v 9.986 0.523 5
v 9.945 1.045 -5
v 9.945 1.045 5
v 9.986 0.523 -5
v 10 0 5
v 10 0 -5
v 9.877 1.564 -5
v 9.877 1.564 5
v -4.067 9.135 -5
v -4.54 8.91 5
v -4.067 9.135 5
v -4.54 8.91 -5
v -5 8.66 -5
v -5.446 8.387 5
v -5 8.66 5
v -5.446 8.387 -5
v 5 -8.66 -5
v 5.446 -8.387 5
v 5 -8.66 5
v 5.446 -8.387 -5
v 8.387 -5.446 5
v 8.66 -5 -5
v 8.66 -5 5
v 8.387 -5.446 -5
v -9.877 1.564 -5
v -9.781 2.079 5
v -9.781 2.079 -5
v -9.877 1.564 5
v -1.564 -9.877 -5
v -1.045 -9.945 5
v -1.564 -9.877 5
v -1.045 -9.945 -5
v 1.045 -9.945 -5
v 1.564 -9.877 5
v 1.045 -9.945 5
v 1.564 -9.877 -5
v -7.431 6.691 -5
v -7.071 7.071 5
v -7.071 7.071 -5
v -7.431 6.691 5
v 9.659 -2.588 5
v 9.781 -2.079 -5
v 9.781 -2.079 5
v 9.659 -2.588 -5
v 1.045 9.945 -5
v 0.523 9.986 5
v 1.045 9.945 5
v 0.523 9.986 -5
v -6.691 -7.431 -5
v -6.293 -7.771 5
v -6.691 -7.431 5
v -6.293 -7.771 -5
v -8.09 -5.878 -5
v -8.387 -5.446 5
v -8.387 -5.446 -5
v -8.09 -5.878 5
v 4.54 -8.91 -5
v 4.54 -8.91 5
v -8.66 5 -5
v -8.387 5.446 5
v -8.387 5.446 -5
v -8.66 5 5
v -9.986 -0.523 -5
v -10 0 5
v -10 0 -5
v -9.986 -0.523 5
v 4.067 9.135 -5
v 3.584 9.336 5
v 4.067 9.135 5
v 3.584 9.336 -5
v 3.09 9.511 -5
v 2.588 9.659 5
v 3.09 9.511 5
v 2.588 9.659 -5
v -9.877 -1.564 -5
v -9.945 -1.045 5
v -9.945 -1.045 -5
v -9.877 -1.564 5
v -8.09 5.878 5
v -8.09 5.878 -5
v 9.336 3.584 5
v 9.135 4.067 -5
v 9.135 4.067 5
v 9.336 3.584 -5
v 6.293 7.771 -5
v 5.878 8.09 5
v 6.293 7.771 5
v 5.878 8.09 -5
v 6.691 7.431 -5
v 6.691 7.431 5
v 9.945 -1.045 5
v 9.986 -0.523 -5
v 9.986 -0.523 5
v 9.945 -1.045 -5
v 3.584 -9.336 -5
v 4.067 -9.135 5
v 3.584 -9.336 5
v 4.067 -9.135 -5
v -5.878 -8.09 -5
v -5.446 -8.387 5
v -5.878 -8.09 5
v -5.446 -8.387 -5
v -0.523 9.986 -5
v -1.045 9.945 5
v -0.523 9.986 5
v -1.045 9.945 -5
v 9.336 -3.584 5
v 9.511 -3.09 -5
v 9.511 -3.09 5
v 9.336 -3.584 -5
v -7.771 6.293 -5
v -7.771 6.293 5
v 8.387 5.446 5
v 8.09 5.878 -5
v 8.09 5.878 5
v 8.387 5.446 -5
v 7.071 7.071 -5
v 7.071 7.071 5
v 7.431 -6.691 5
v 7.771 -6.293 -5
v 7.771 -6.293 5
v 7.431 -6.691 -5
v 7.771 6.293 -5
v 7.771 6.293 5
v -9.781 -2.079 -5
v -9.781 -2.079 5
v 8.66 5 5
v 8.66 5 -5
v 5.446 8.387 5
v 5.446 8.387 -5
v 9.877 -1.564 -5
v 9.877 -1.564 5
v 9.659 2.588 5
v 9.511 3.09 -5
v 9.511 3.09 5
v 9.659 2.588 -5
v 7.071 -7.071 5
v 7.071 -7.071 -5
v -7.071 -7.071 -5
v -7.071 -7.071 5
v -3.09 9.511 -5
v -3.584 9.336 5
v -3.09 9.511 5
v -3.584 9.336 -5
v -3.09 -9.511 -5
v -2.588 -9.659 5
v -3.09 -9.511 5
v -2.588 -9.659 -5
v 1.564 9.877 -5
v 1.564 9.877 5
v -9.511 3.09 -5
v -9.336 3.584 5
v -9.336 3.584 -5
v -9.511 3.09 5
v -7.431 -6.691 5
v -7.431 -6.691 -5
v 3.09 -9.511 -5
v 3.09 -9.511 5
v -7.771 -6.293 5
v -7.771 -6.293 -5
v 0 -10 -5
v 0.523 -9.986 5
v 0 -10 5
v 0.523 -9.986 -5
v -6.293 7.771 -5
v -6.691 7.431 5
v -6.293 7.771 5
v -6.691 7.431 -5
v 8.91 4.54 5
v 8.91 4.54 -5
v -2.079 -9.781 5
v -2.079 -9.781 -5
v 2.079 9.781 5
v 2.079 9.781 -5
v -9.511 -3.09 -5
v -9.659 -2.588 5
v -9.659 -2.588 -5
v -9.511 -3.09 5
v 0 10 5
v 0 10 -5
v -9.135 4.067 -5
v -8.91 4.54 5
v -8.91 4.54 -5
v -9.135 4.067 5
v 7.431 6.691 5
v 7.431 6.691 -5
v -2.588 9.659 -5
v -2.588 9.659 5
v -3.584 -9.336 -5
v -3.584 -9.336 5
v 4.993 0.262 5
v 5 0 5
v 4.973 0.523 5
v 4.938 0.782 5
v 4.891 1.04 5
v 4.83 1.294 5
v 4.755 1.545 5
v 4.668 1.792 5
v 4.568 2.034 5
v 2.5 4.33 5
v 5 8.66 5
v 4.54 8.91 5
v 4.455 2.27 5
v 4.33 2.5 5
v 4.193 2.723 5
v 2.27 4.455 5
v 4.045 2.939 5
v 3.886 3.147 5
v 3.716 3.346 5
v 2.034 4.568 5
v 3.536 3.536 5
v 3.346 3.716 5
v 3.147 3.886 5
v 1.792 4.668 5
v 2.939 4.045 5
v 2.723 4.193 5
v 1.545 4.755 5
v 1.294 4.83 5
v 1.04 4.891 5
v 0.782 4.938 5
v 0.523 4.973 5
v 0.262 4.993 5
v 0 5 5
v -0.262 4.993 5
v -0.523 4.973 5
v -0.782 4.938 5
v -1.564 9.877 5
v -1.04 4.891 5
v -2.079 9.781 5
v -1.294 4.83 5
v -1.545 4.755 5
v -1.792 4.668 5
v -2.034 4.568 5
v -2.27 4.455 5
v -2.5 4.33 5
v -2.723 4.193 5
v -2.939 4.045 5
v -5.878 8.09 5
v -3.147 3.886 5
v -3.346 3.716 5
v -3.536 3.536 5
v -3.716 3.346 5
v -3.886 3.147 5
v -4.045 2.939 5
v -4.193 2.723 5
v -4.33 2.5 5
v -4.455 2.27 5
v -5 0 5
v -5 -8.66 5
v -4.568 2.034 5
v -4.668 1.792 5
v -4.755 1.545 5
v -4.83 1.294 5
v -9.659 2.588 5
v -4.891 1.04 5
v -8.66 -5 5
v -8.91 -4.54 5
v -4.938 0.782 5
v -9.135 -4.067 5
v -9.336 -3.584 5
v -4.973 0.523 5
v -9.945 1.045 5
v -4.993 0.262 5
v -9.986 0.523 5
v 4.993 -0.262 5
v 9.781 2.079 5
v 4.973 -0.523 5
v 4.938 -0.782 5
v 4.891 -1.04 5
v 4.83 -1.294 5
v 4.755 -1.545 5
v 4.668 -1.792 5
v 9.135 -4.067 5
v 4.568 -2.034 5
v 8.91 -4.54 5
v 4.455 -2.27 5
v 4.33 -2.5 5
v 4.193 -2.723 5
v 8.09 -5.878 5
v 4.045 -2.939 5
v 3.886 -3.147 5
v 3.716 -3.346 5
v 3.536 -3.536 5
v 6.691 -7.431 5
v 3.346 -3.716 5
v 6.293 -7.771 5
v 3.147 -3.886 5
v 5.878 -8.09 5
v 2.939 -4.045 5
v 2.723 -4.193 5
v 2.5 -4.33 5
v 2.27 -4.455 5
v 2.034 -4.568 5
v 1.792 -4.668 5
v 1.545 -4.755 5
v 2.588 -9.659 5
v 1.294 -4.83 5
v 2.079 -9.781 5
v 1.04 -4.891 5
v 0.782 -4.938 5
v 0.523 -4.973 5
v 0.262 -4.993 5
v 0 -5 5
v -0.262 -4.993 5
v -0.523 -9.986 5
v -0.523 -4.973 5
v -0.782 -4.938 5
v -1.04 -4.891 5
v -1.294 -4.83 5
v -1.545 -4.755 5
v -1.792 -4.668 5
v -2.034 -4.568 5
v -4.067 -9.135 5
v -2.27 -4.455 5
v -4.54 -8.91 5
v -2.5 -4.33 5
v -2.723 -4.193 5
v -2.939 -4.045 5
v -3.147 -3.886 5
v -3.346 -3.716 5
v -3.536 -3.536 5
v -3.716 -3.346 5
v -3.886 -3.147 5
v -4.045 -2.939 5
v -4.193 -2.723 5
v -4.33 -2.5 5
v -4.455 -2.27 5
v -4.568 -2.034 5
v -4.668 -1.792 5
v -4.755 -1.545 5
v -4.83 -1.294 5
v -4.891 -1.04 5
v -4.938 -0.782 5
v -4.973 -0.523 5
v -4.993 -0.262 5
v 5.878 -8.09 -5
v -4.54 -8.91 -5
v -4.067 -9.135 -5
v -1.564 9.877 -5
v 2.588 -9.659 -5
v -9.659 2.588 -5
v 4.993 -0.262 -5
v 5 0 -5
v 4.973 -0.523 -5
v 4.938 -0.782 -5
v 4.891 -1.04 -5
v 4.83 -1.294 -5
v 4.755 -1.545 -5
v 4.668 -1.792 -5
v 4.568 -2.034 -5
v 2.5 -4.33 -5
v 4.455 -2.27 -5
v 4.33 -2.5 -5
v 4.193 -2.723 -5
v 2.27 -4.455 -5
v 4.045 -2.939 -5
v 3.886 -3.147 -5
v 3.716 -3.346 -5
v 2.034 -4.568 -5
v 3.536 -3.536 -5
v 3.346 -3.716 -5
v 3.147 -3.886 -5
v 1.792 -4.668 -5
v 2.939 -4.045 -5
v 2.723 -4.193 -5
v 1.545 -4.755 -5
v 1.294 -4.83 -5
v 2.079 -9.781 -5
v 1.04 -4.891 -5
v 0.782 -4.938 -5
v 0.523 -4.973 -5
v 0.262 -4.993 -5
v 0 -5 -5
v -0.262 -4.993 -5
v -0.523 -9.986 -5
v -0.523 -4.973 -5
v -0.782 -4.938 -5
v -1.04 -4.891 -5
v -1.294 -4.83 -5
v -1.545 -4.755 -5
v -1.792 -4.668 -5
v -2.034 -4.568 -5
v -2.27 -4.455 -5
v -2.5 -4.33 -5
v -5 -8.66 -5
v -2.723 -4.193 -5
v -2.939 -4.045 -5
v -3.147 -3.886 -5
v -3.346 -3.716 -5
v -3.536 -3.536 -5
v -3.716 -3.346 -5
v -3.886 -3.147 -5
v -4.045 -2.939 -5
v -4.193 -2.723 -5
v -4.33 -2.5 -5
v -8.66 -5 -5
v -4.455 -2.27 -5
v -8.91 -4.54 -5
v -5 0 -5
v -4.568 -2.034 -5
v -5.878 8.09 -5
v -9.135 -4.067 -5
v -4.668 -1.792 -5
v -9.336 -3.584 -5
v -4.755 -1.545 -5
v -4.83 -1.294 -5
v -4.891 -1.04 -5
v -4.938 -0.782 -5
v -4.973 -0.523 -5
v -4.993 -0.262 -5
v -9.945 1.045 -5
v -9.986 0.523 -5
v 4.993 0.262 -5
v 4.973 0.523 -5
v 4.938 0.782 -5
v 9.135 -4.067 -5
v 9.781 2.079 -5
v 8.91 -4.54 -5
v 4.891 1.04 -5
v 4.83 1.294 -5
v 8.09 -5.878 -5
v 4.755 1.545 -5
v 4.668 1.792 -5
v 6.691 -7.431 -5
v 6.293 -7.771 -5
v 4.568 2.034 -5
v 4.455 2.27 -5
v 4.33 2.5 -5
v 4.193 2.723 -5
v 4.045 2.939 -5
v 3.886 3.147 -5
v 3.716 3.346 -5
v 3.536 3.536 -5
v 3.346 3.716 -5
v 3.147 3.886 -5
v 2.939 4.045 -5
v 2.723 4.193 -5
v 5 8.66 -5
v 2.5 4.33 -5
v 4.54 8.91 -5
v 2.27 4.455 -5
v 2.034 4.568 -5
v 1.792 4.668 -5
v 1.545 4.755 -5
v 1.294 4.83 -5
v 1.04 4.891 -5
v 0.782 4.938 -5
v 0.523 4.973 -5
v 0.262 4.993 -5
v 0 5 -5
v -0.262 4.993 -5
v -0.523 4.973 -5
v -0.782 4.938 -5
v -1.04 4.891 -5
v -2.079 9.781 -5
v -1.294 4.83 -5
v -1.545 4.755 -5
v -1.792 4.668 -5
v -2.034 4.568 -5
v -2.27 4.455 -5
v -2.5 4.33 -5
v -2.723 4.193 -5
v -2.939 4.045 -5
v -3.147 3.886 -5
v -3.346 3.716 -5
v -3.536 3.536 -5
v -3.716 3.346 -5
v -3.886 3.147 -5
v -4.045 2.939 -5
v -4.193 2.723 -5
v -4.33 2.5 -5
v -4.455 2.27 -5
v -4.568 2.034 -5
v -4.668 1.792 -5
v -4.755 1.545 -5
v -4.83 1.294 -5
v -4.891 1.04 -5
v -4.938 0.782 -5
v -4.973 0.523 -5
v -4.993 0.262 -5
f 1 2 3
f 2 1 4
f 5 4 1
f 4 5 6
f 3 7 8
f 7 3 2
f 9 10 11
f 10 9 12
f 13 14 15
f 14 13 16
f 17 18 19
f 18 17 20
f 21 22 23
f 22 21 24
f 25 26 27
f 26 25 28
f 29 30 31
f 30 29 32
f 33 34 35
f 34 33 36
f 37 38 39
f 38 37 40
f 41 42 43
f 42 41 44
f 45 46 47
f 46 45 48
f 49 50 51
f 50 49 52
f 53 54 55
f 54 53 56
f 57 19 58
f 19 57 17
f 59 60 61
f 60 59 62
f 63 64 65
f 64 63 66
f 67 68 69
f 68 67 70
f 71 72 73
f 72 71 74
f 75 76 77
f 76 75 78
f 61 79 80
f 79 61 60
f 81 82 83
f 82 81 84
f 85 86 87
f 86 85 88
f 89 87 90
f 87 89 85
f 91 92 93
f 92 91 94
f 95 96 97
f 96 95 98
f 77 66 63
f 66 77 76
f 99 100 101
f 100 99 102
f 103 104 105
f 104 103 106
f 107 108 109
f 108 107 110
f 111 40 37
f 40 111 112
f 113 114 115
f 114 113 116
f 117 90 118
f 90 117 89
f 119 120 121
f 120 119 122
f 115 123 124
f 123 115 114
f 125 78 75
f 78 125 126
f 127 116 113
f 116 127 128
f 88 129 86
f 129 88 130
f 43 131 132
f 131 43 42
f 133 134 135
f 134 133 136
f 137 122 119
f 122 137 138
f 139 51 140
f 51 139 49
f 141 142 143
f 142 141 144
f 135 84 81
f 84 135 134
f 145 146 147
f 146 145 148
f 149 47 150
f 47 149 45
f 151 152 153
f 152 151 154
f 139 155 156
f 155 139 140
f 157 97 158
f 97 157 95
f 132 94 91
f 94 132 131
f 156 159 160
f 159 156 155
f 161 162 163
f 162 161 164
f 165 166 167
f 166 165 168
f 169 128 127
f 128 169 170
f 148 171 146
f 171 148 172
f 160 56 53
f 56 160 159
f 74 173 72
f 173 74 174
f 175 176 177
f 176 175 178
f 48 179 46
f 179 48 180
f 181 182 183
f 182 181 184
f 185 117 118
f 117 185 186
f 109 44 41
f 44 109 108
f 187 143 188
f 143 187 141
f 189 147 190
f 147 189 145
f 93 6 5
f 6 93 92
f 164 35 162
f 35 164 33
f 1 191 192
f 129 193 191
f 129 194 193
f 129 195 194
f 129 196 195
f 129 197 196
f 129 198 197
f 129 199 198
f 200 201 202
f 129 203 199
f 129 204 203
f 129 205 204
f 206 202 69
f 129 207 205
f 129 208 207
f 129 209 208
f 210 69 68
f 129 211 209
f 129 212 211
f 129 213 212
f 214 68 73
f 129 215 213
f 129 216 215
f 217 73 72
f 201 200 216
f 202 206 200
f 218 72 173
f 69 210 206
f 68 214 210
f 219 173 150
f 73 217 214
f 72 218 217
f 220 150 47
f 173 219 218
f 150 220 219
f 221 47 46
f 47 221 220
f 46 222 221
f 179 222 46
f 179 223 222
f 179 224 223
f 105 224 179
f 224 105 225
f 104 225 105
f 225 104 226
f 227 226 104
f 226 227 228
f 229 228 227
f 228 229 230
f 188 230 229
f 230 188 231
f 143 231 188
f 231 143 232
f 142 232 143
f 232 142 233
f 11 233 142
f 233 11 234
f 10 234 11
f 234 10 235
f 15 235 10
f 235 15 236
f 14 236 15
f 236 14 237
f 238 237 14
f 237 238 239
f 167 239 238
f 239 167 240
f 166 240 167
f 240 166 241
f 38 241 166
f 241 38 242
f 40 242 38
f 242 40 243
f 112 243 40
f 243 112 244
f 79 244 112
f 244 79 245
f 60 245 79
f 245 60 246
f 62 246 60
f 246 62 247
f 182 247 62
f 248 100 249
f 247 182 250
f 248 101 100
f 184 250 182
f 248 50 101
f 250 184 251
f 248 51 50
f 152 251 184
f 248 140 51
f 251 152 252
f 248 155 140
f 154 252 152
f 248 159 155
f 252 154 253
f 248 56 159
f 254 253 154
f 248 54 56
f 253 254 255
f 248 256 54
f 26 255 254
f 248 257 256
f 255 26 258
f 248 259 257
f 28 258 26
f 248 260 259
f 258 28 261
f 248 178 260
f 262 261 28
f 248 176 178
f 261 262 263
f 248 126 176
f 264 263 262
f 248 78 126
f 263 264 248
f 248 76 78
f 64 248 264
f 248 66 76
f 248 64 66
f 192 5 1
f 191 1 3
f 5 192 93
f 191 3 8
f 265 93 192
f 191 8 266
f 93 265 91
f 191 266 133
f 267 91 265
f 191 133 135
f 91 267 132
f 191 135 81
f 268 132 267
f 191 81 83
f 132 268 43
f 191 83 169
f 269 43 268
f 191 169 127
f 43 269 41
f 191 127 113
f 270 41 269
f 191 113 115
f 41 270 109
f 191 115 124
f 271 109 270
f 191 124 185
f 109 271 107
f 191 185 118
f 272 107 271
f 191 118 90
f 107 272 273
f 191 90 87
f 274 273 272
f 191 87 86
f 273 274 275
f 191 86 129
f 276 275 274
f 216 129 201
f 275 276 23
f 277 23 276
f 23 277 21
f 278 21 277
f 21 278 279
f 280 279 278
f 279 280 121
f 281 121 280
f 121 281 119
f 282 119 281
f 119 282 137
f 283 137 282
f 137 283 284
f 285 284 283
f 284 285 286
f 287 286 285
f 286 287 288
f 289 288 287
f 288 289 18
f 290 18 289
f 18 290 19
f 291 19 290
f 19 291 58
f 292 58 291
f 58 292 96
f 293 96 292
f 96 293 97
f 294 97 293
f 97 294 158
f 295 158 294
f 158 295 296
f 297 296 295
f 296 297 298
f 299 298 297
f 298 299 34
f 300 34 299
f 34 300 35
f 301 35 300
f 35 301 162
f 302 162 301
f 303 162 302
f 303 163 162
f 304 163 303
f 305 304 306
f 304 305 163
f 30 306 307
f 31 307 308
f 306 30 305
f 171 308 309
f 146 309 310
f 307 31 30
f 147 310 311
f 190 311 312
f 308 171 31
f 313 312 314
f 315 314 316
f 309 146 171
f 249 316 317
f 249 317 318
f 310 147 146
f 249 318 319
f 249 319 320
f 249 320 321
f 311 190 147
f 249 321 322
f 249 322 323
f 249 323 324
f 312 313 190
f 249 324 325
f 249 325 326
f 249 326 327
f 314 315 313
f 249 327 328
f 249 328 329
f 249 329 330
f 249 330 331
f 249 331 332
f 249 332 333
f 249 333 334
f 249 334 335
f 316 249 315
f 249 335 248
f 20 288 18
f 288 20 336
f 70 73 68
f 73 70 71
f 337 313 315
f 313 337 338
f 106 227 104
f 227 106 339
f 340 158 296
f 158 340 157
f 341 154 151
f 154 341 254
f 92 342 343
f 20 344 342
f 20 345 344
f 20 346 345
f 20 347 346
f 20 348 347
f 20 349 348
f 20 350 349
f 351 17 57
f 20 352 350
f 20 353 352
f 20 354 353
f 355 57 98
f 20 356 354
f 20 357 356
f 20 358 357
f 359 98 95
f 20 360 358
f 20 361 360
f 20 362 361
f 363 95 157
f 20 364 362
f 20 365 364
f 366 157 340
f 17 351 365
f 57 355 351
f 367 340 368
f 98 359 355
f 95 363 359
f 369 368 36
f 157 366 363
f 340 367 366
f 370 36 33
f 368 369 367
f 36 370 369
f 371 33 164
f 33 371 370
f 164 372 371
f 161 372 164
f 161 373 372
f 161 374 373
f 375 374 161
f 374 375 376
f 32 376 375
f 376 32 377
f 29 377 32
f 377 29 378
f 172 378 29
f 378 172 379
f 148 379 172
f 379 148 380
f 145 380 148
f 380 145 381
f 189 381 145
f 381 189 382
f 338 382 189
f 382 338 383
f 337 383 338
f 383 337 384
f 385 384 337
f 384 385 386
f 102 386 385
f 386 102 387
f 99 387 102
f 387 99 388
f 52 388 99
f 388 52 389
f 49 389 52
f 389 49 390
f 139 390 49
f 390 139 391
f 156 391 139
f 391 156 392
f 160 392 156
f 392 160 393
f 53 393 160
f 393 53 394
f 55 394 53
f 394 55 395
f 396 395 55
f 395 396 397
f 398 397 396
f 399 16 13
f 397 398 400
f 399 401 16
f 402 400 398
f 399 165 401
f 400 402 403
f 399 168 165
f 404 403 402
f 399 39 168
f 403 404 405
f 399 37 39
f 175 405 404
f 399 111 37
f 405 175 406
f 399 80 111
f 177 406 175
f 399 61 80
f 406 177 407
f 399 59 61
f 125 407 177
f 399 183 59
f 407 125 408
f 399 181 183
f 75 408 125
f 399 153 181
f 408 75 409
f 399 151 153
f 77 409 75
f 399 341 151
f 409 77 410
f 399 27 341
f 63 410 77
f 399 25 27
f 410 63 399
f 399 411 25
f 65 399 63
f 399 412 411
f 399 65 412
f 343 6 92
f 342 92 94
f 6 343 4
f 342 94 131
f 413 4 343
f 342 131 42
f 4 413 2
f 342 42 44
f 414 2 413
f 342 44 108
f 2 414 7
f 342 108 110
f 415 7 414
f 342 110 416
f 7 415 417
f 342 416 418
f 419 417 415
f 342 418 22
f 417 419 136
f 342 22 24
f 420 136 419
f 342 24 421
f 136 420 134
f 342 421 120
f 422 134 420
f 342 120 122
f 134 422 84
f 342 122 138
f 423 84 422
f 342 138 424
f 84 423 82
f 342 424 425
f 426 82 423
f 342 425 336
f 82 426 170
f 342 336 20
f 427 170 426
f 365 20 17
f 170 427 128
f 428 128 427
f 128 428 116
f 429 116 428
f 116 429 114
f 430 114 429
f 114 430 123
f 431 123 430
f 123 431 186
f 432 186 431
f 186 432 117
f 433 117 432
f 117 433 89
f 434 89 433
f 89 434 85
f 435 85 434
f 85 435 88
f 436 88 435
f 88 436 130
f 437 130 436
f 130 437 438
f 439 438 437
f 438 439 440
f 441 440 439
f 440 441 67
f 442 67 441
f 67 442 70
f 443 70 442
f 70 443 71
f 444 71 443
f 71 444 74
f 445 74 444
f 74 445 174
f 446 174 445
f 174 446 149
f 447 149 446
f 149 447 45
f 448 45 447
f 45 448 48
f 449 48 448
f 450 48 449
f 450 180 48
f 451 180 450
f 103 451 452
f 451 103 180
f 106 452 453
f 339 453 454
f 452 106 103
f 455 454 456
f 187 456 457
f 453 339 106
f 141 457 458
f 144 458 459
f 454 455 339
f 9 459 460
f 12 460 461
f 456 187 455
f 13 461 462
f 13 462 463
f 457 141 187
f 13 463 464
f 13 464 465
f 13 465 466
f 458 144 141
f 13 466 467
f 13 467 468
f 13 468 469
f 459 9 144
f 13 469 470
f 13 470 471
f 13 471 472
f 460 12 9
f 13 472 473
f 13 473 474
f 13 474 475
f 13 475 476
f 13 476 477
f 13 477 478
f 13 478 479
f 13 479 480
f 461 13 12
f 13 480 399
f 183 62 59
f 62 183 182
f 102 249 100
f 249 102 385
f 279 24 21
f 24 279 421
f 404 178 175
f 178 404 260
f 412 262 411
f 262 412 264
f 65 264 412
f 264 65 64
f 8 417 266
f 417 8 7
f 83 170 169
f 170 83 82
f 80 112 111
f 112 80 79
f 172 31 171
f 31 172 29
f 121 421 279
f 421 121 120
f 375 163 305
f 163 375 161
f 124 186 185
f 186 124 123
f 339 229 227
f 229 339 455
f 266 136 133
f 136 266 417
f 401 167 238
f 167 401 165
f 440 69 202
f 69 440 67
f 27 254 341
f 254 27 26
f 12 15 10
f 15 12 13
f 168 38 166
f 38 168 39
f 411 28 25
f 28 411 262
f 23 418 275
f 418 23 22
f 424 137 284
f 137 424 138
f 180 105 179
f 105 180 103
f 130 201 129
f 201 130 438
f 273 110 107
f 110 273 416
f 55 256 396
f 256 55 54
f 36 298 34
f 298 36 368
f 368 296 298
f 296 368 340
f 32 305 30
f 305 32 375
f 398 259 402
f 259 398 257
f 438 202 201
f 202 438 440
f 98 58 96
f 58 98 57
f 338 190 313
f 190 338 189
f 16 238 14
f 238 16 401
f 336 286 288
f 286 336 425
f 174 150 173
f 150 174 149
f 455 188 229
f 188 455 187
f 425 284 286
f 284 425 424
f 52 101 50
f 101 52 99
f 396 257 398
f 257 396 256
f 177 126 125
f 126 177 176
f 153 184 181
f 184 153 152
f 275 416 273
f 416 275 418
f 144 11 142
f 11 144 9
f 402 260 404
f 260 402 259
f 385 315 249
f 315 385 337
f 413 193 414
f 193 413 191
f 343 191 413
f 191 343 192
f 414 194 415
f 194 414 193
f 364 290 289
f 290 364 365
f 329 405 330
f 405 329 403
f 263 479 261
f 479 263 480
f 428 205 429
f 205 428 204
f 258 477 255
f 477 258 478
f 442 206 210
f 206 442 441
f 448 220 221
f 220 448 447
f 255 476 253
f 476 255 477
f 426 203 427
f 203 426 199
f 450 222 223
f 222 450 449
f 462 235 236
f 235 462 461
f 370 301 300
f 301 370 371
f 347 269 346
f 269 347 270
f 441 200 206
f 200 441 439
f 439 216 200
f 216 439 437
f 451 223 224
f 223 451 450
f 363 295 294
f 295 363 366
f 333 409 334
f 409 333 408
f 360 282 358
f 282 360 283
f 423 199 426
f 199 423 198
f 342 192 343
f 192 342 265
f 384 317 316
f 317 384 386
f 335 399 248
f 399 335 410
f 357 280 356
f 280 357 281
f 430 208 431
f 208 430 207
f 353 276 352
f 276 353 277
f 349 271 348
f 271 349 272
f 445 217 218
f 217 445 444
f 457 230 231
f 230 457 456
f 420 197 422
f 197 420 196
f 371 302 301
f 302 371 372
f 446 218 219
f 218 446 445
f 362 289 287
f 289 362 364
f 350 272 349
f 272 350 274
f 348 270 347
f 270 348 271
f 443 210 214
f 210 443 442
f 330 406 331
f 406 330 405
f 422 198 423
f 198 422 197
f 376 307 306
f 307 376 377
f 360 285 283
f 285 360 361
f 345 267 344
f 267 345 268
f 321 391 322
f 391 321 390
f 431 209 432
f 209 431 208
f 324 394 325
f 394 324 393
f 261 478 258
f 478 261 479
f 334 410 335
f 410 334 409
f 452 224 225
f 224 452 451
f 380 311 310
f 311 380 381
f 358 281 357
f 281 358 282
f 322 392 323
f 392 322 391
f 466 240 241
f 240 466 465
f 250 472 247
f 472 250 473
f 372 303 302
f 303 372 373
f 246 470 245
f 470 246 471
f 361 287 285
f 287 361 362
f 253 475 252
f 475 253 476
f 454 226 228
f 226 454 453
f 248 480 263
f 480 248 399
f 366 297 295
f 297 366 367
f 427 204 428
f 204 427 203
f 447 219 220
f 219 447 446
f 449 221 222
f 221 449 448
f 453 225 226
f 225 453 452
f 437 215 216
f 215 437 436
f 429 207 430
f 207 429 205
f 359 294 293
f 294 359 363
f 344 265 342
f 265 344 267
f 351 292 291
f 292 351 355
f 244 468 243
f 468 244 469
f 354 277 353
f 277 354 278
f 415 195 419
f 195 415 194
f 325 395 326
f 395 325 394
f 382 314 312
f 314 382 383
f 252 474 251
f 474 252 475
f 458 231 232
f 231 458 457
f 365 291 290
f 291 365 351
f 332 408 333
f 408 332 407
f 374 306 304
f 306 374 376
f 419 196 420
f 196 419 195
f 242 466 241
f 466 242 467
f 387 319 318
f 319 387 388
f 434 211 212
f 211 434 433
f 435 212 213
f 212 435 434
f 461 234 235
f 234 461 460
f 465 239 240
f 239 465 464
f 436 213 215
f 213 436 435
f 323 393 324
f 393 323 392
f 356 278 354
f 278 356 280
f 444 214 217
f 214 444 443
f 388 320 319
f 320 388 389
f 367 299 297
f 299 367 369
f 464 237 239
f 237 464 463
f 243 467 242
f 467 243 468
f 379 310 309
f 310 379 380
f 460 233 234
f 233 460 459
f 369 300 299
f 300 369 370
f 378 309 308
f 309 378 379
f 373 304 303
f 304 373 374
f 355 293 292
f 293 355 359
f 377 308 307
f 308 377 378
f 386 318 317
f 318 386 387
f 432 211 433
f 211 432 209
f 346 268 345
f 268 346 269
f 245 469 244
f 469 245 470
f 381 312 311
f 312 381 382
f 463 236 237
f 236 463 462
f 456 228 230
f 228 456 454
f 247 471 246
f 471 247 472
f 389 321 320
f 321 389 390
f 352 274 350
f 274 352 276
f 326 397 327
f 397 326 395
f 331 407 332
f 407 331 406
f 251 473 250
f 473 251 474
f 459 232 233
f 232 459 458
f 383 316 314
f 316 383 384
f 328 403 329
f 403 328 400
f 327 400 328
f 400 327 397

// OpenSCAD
/* * * * * * * * * * * * * * * * * * * * * * * * * * * * * * * * * * * * *\
 * Copyright (C) Claus Schrammel <claus@f05fk.net>                       *
 *                                                                       *
 * This program is free software: you can redistribute it and/or modify  *
 * it under the terms of the GNU General Public License as published by  *
 * the Free Software Foundation, either version 3 of the License, or     *
 * (at your option) any later version.                                   *
 *                                                                       *
 * This program is distributed in the hope that it will be useful,       *
 * but WITHOUT ANY WARRANTY; without even the implied warranty of        *
 * MERCHANTABILITY or FITNESS FOR A PARTICULAR PURPOSE.  See the         *
 * GNU General Public License for more details.                          *
 *                                                                       *
 * You should have received a copy of the GNU General Public License     *
 * along with this program.  If not, see <http://www.gnu.org/licenses/>. *
 *                                                                       *
 * SPDX-License-Identifier: GPL-3.0-or-later                             *
\* * * * * * * * * * * * * * * * * * * * * * * * * * * * * * * * * * * * */
$fn = 120;

Ring(h = 10, dout = 20, din = 10, center = true);

module Ring(h, dout, din, center = false) {
    translate(center == true ? [0, 0, 0] : [0, 0, h / 2])
    difference() {
        // cylinder
        cylinder(h = h, d = dout, center = true);
        // hole
        cylinder(h = h + 2, d = din, center = true);
    }
}
